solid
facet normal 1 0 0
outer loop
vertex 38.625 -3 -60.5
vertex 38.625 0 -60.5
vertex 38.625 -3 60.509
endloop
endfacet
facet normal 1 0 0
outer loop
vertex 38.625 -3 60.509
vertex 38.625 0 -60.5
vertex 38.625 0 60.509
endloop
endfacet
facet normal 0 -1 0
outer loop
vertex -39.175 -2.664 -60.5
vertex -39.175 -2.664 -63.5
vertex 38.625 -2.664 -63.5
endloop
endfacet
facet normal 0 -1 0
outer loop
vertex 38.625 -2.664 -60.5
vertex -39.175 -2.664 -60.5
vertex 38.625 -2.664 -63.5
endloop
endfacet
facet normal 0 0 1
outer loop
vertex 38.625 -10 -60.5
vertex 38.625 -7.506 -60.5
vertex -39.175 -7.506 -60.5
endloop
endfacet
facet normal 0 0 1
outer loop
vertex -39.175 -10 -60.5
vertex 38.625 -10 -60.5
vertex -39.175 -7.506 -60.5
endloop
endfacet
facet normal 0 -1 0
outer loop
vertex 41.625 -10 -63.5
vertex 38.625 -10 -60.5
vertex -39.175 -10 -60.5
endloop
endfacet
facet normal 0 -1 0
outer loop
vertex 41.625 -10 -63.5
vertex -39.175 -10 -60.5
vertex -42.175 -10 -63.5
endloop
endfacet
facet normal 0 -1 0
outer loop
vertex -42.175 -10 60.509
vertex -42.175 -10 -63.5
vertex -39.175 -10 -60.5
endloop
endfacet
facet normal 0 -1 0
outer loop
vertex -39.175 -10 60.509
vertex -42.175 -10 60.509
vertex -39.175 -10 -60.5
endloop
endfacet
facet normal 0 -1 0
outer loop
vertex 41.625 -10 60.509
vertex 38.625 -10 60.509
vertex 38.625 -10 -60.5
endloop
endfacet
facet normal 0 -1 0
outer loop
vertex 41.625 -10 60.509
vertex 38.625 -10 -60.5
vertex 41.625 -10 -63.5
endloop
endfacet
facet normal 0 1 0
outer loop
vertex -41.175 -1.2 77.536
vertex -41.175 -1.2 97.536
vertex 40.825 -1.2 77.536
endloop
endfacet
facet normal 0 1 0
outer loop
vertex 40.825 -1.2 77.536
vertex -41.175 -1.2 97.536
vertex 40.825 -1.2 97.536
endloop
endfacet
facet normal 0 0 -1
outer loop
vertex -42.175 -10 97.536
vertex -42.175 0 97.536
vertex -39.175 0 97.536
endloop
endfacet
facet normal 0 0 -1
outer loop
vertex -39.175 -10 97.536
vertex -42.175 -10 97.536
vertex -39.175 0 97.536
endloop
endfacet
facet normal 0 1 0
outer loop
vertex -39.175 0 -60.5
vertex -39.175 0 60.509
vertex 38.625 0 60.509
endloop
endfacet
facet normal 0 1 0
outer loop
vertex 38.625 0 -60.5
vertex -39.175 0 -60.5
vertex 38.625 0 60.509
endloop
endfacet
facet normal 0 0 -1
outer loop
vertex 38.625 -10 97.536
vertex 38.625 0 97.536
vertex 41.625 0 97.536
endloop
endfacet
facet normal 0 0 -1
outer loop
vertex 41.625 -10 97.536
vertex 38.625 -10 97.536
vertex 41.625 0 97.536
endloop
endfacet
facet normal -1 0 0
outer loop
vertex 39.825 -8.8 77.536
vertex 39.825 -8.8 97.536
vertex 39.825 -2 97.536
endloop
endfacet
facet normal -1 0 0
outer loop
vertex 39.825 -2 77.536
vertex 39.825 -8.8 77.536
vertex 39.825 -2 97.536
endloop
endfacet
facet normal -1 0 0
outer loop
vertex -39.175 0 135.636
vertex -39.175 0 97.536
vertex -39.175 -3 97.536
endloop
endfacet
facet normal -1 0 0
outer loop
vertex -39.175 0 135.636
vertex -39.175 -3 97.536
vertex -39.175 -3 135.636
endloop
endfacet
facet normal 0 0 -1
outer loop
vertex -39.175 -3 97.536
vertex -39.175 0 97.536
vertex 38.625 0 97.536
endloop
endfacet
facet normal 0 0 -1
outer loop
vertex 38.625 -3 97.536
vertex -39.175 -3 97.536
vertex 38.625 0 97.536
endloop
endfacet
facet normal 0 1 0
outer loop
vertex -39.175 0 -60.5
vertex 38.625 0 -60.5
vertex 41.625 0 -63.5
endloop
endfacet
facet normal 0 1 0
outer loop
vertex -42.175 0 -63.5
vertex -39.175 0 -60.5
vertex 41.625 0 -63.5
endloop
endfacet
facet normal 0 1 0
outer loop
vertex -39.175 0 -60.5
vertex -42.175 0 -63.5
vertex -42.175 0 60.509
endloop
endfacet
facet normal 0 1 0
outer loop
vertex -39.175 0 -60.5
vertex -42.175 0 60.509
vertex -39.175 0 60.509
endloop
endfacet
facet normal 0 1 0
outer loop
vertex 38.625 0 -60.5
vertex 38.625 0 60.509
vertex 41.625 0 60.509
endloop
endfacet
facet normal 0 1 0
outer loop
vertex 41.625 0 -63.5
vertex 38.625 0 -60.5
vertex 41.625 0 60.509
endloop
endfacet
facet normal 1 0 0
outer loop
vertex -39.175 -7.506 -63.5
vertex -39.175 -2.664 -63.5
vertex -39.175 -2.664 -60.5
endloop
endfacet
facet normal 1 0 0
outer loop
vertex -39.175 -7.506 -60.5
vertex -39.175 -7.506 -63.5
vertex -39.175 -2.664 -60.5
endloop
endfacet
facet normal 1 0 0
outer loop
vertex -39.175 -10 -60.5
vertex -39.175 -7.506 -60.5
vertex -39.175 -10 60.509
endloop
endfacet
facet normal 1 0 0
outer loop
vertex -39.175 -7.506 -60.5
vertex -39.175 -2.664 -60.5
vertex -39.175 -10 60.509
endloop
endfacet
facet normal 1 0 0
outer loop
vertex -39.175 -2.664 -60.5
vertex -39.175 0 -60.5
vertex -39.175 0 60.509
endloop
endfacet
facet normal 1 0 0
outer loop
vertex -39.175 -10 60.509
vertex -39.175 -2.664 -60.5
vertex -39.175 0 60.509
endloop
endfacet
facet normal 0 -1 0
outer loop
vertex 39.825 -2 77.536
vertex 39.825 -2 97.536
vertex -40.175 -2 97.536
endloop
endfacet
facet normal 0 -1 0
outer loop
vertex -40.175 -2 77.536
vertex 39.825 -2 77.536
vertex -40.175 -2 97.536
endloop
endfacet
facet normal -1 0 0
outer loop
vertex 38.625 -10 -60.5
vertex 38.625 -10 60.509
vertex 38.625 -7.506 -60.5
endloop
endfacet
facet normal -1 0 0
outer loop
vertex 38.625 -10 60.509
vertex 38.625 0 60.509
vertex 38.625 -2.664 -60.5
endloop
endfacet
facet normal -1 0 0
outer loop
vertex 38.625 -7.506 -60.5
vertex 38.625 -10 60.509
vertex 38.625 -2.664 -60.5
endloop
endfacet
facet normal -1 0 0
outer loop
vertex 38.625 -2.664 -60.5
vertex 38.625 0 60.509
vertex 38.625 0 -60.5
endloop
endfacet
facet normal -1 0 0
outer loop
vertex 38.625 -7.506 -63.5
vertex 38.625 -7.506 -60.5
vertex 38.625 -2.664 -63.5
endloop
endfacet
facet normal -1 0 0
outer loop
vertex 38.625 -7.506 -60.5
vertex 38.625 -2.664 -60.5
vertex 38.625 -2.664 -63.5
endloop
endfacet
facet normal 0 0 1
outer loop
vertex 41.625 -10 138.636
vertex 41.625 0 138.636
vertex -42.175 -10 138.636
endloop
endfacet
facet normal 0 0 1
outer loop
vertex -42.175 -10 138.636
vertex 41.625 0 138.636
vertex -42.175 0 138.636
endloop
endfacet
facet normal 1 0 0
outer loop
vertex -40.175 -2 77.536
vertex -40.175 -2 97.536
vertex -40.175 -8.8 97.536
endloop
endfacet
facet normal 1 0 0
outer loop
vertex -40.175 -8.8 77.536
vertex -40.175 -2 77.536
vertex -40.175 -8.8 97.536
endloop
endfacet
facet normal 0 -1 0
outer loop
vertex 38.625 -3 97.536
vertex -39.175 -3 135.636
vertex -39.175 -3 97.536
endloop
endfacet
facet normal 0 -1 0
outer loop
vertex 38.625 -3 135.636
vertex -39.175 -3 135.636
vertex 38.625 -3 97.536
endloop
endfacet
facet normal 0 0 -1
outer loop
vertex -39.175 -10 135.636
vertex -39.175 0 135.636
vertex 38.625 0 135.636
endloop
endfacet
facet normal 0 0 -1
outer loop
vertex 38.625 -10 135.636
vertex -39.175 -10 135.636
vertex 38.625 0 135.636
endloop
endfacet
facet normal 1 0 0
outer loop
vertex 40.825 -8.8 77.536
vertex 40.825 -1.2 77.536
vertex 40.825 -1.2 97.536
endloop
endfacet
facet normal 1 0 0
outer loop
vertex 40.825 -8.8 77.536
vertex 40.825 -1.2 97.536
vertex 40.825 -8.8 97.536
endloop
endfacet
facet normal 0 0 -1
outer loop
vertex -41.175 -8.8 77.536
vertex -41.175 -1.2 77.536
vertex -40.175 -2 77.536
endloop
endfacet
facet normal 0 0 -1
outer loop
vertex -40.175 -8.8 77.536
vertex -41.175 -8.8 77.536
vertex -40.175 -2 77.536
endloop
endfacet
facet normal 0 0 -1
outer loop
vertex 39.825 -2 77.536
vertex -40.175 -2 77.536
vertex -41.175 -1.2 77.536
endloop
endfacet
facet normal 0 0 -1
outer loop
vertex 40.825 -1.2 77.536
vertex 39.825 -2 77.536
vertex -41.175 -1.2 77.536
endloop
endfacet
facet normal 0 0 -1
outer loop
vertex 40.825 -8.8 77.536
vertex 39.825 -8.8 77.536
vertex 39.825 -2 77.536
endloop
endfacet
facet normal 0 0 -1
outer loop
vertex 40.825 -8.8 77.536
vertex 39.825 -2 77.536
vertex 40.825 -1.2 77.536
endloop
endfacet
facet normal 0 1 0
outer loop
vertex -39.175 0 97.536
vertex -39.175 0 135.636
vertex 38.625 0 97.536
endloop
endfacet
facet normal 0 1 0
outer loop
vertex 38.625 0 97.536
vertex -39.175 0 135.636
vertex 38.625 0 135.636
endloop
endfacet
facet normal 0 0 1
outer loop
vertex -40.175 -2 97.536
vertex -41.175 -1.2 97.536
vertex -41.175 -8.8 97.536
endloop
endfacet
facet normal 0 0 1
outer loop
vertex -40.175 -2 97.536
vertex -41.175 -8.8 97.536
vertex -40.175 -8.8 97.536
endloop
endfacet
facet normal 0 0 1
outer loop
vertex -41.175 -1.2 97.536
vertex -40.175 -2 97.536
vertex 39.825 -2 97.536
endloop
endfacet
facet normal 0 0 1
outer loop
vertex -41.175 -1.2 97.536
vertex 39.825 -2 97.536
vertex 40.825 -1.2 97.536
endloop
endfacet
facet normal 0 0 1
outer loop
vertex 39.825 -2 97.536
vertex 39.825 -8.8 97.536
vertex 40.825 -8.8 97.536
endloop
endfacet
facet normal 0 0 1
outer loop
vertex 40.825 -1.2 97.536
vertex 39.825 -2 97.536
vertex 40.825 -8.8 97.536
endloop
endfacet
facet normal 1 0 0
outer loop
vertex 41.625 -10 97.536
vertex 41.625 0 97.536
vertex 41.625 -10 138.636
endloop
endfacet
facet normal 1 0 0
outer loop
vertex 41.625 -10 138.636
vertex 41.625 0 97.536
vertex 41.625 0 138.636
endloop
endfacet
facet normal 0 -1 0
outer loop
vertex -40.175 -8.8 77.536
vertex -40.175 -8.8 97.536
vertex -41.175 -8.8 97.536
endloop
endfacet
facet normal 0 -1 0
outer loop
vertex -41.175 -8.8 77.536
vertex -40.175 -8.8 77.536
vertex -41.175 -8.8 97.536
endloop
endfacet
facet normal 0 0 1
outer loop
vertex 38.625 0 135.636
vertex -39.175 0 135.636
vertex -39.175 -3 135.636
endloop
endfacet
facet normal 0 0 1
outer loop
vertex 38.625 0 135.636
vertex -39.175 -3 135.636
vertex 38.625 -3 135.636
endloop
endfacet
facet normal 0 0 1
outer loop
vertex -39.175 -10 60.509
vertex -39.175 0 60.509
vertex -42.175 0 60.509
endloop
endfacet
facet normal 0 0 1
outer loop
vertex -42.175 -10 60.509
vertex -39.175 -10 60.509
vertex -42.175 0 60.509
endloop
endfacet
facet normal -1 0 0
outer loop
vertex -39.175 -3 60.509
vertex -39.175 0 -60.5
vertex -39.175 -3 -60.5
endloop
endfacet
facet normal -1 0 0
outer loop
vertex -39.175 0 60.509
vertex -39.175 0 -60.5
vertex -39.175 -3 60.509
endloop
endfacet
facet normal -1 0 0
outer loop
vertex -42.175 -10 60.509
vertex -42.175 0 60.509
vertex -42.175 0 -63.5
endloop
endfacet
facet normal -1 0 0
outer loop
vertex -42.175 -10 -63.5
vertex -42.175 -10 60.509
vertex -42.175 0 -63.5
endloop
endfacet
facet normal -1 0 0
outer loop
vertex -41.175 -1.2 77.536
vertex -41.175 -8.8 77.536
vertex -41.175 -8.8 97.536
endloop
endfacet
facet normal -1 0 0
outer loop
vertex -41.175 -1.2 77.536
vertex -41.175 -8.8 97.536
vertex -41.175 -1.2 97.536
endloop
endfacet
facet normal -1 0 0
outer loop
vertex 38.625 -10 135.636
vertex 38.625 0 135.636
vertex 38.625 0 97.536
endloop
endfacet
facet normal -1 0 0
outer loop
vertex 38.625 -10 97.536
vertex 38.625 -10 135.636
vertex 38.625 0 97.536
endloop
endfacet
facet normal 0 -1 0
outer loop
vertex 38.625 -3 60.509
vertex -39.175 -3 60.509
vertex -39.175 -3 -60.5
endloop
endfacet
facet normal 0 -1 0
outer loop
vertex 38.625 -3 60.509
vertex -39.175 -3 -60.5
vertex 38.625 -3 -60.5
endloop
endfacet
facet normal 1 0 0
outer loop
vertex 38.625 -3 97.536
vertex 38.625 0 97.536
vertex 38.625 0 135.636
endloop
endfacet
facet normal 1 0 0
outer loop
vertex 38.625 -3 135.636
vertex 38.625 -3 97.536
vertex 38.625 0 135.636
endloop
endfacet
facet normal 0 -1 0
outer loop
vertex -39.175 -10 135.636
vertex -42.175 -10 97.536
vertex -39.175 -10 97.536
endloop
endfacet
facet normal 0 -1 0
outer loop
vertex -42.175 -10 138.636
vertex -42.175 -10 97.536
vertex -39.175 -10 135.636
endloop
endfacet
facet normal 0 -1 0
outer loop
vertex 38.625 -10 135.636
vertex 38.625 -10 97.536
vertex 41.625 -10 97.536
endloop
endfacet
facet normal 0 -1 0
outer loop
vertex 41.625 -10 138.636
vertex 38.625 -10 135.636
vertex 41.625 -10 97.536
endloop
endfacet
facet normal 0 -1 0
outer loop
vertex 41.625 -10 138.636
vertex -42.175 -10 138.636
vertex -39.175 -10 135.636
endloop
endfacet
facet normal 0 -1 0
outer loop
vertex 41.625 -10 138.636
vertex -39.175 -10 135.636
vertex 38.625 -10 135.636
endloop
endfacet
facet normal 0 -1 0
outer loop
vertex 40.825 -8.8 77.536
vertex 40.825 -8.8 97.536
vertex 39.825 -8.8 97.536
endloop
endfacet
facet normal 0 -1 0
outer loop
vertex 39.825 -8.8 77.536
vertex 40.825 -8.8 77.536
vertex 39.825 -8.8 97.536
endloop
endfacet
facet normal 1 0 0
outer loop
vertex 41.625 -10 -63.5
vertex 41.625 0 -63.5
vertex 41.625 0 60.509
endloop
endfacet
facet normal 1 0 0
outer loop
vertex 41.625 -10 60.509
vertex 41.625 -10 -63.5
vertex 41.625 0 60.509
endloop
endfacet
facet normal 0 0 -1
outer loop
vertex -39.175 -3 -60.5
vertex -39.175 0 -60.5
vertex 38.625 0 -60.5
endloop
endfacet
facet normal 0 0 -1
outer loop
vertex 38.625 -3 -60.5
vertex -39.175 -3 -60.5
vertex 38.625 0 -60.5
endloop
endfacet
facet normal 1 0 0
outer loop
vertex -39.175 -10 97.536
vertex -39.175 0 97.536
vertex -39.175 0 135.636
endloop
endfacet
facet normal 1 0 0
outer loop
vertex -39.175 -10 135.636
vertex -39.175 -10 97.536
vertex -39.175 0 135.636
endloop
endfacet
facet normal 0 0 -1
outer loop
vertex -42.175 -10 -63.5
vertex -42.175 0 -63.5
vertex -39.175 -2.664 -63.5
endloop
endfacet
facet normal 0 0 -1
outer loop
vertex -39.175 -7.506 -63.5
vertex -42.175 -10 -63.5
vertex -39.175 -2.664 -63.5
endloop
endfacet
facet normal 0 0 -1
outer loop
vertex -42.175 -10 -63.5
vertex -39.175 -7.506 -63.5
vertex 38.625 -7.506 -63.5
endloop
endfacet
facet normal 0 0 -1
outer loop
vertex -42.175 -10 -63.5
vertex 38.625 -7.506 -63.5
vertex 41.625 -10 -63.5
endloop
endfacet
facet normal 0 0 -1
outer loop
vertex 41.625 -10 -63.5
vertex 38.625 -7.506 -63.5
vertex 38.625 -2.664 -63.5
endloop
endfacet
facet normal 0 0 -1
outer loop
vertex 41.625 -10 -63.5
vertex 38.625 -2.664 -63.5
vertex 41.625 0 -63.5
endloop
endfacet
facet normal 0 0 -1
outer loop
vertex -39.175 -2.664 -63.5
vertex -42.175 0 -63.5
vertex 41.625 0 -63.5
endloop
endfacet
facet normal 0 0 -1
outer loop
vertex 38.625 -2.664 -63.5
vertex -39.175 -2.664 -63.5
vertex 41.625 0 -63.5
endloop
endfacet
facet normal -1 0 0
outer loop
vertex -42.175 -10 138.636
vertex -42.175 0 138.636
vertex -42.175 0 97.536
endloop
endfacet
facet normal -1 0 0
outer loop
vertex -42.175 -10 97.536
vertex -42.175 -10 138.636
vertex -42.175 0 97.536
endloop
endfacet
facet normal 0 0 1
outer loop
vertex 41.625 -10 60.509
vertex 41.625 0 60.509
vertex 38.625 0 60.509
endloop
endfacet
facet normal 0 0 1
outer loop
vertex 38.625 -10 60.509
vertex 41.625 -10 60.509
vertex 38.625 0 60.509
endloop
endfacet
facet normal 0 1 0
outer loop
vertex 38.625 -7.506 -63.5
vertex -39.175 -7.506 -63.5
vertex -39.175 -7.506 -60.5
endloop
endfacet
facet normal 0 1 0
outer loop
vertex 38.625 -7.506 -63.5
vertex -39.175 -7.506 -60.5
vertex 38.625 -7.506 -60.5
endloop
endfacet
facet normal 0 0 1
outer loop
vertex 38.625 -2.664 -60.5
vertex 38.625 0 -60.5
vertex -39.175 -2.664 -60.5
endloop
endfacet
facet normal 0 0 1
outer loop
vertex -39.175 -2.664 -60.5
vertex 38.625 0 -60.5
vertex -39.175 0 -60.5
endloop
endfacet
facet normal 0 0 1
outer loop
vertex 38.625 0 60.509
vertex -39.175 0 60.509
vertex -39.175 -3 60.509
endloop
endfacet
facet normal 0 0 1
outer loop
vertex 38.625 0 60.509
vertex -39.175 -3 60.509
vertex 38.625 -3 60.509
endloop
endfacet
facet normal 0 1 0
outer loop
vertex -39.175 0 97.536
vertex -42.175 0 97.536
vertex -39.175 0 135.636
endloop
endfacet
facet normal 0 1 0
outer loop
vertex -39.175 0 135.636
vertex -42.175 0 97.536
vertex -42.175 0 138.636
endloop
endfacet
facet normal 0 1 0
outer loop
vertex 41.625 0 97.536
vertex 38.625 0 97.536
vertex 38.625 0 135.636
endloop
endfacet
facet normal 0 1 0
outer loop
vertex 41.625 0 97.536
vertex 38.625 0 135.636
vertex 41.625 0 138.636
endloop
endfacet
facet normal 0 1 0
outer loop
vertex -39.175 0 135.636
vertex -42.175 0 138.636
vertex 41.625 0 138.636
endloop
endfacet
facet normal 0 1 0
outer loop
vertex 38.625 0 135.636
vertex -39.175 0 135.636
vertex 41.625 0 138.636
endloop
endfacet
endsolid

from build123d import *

# Parameters (mm, degrees)
F0_W     = 77.8
F0_H     = 121.0094395578
F1_DEPTH = 3
F0_H_2   = 38.1
F2_DEPTH = 10
F3_W     = 77.8
F3_H     = 4.8423867873
F4_DEPTH = 25
F5_W     = 77.8
F5_H     = 0.8
F6_DEPTH = 20


with BuildPart() as f1:
    # F0 (on Front) → F1 (new body)
    with BuildSketch(Plane.XZ):
        with Locations((-0.2750502467, 0.0047197789)):
            Rectangle(F0_W, F0_H)
    extrude(amount=F1_DEPTH)


with BuildPart() as f1b:
    # F0 (on Front) → F1, piece 2 (new body)
    with BuildSketch(Plane.XZ):
        with Locations((-0.2750502467, 116.5858240604)):
            Rectangle(F0_W, F0_H_2)
    extrude(amount=F1_DEPTH)


with BuildPart() as f2:
    # F0 (on Front) → F2 (new body)
    with BuildSketch(Plane.XZ):
        Polygon((38.6249497533, 60.5094395578), (38.6249497533, -60.5), (-39.1750502467, -60.5), (-39.1750502467, 60.5094395578), (-42.1750502467, 60.5094395578), (-42.1750502467, -63.5), (41.6249497533, -63.5), (41.6249497533, 60.5094395578), align=None)
    extrude(amount=F2_DEPTH)

    # F3 (on face) → F4 (cut)
    with BuildSketch(Plane(origin=(0, 0, -63.5), x_dir=(1, 0, 0), z_dir=(0, 0, -1))):
        with Locations((-0.2750502467, 5.085134937)):
            Rectangle(F3_W, F3_H)
    extrude(amount=-F4_DEPTH, mode=Mode.SUBTRACT)


with BuildPart() as f2b:
    # F0 (on Front) → F2, piece 2 (new body)
    with BuildSketch(Plane.XZ):
        Polygon((38.6249497533, 135.6358240604), (38.6249497533, 97.5358240604), (41.6249497533, 97.5358240604), (41.6249497533, 138.6358240604), (-42.1750502467, 138.6358240604), (-42.1750502467, 97.5358240604), (-39.1750502467, 97.5358240604), (-39.1750502467, 135.6358240604), align=None)
    extrude(amount=F2_DEPTH)


with BuildPart() as f6:
    # F5 (on face) → F6 (new body)
    with BuildSketch(Plane(origin=(0, 0, 97.5358240604), x_dir=(1, 0, 0), z_dir=(0, 0, -1))):
        with Locations((-0.2750502467, 1.6)):
            Rectangle(F5_W, F5_H)
        Polygon((39.8249497533, 2), (38.6249497533, 2), (38.6249497533, 1.2), (39.8249497533, 1.2), (40.8249497533, 1.2), (40.8249497533, 8.8), (39.8249497533, 8.8), align=None)
        Polygon((-39.1750502467, 2), (-40.1750502467, 2), (-40.1750502467, 8.8), (-41.1750502467, 8.8), (-41.1750502467, 1.2), (-39.1750502467, 1.2), align=None)
    extrude(amount=F6_DEPTH)


solid = Compound([f1.part, f1b.part, f2.part, f2b.part, f6.part])
